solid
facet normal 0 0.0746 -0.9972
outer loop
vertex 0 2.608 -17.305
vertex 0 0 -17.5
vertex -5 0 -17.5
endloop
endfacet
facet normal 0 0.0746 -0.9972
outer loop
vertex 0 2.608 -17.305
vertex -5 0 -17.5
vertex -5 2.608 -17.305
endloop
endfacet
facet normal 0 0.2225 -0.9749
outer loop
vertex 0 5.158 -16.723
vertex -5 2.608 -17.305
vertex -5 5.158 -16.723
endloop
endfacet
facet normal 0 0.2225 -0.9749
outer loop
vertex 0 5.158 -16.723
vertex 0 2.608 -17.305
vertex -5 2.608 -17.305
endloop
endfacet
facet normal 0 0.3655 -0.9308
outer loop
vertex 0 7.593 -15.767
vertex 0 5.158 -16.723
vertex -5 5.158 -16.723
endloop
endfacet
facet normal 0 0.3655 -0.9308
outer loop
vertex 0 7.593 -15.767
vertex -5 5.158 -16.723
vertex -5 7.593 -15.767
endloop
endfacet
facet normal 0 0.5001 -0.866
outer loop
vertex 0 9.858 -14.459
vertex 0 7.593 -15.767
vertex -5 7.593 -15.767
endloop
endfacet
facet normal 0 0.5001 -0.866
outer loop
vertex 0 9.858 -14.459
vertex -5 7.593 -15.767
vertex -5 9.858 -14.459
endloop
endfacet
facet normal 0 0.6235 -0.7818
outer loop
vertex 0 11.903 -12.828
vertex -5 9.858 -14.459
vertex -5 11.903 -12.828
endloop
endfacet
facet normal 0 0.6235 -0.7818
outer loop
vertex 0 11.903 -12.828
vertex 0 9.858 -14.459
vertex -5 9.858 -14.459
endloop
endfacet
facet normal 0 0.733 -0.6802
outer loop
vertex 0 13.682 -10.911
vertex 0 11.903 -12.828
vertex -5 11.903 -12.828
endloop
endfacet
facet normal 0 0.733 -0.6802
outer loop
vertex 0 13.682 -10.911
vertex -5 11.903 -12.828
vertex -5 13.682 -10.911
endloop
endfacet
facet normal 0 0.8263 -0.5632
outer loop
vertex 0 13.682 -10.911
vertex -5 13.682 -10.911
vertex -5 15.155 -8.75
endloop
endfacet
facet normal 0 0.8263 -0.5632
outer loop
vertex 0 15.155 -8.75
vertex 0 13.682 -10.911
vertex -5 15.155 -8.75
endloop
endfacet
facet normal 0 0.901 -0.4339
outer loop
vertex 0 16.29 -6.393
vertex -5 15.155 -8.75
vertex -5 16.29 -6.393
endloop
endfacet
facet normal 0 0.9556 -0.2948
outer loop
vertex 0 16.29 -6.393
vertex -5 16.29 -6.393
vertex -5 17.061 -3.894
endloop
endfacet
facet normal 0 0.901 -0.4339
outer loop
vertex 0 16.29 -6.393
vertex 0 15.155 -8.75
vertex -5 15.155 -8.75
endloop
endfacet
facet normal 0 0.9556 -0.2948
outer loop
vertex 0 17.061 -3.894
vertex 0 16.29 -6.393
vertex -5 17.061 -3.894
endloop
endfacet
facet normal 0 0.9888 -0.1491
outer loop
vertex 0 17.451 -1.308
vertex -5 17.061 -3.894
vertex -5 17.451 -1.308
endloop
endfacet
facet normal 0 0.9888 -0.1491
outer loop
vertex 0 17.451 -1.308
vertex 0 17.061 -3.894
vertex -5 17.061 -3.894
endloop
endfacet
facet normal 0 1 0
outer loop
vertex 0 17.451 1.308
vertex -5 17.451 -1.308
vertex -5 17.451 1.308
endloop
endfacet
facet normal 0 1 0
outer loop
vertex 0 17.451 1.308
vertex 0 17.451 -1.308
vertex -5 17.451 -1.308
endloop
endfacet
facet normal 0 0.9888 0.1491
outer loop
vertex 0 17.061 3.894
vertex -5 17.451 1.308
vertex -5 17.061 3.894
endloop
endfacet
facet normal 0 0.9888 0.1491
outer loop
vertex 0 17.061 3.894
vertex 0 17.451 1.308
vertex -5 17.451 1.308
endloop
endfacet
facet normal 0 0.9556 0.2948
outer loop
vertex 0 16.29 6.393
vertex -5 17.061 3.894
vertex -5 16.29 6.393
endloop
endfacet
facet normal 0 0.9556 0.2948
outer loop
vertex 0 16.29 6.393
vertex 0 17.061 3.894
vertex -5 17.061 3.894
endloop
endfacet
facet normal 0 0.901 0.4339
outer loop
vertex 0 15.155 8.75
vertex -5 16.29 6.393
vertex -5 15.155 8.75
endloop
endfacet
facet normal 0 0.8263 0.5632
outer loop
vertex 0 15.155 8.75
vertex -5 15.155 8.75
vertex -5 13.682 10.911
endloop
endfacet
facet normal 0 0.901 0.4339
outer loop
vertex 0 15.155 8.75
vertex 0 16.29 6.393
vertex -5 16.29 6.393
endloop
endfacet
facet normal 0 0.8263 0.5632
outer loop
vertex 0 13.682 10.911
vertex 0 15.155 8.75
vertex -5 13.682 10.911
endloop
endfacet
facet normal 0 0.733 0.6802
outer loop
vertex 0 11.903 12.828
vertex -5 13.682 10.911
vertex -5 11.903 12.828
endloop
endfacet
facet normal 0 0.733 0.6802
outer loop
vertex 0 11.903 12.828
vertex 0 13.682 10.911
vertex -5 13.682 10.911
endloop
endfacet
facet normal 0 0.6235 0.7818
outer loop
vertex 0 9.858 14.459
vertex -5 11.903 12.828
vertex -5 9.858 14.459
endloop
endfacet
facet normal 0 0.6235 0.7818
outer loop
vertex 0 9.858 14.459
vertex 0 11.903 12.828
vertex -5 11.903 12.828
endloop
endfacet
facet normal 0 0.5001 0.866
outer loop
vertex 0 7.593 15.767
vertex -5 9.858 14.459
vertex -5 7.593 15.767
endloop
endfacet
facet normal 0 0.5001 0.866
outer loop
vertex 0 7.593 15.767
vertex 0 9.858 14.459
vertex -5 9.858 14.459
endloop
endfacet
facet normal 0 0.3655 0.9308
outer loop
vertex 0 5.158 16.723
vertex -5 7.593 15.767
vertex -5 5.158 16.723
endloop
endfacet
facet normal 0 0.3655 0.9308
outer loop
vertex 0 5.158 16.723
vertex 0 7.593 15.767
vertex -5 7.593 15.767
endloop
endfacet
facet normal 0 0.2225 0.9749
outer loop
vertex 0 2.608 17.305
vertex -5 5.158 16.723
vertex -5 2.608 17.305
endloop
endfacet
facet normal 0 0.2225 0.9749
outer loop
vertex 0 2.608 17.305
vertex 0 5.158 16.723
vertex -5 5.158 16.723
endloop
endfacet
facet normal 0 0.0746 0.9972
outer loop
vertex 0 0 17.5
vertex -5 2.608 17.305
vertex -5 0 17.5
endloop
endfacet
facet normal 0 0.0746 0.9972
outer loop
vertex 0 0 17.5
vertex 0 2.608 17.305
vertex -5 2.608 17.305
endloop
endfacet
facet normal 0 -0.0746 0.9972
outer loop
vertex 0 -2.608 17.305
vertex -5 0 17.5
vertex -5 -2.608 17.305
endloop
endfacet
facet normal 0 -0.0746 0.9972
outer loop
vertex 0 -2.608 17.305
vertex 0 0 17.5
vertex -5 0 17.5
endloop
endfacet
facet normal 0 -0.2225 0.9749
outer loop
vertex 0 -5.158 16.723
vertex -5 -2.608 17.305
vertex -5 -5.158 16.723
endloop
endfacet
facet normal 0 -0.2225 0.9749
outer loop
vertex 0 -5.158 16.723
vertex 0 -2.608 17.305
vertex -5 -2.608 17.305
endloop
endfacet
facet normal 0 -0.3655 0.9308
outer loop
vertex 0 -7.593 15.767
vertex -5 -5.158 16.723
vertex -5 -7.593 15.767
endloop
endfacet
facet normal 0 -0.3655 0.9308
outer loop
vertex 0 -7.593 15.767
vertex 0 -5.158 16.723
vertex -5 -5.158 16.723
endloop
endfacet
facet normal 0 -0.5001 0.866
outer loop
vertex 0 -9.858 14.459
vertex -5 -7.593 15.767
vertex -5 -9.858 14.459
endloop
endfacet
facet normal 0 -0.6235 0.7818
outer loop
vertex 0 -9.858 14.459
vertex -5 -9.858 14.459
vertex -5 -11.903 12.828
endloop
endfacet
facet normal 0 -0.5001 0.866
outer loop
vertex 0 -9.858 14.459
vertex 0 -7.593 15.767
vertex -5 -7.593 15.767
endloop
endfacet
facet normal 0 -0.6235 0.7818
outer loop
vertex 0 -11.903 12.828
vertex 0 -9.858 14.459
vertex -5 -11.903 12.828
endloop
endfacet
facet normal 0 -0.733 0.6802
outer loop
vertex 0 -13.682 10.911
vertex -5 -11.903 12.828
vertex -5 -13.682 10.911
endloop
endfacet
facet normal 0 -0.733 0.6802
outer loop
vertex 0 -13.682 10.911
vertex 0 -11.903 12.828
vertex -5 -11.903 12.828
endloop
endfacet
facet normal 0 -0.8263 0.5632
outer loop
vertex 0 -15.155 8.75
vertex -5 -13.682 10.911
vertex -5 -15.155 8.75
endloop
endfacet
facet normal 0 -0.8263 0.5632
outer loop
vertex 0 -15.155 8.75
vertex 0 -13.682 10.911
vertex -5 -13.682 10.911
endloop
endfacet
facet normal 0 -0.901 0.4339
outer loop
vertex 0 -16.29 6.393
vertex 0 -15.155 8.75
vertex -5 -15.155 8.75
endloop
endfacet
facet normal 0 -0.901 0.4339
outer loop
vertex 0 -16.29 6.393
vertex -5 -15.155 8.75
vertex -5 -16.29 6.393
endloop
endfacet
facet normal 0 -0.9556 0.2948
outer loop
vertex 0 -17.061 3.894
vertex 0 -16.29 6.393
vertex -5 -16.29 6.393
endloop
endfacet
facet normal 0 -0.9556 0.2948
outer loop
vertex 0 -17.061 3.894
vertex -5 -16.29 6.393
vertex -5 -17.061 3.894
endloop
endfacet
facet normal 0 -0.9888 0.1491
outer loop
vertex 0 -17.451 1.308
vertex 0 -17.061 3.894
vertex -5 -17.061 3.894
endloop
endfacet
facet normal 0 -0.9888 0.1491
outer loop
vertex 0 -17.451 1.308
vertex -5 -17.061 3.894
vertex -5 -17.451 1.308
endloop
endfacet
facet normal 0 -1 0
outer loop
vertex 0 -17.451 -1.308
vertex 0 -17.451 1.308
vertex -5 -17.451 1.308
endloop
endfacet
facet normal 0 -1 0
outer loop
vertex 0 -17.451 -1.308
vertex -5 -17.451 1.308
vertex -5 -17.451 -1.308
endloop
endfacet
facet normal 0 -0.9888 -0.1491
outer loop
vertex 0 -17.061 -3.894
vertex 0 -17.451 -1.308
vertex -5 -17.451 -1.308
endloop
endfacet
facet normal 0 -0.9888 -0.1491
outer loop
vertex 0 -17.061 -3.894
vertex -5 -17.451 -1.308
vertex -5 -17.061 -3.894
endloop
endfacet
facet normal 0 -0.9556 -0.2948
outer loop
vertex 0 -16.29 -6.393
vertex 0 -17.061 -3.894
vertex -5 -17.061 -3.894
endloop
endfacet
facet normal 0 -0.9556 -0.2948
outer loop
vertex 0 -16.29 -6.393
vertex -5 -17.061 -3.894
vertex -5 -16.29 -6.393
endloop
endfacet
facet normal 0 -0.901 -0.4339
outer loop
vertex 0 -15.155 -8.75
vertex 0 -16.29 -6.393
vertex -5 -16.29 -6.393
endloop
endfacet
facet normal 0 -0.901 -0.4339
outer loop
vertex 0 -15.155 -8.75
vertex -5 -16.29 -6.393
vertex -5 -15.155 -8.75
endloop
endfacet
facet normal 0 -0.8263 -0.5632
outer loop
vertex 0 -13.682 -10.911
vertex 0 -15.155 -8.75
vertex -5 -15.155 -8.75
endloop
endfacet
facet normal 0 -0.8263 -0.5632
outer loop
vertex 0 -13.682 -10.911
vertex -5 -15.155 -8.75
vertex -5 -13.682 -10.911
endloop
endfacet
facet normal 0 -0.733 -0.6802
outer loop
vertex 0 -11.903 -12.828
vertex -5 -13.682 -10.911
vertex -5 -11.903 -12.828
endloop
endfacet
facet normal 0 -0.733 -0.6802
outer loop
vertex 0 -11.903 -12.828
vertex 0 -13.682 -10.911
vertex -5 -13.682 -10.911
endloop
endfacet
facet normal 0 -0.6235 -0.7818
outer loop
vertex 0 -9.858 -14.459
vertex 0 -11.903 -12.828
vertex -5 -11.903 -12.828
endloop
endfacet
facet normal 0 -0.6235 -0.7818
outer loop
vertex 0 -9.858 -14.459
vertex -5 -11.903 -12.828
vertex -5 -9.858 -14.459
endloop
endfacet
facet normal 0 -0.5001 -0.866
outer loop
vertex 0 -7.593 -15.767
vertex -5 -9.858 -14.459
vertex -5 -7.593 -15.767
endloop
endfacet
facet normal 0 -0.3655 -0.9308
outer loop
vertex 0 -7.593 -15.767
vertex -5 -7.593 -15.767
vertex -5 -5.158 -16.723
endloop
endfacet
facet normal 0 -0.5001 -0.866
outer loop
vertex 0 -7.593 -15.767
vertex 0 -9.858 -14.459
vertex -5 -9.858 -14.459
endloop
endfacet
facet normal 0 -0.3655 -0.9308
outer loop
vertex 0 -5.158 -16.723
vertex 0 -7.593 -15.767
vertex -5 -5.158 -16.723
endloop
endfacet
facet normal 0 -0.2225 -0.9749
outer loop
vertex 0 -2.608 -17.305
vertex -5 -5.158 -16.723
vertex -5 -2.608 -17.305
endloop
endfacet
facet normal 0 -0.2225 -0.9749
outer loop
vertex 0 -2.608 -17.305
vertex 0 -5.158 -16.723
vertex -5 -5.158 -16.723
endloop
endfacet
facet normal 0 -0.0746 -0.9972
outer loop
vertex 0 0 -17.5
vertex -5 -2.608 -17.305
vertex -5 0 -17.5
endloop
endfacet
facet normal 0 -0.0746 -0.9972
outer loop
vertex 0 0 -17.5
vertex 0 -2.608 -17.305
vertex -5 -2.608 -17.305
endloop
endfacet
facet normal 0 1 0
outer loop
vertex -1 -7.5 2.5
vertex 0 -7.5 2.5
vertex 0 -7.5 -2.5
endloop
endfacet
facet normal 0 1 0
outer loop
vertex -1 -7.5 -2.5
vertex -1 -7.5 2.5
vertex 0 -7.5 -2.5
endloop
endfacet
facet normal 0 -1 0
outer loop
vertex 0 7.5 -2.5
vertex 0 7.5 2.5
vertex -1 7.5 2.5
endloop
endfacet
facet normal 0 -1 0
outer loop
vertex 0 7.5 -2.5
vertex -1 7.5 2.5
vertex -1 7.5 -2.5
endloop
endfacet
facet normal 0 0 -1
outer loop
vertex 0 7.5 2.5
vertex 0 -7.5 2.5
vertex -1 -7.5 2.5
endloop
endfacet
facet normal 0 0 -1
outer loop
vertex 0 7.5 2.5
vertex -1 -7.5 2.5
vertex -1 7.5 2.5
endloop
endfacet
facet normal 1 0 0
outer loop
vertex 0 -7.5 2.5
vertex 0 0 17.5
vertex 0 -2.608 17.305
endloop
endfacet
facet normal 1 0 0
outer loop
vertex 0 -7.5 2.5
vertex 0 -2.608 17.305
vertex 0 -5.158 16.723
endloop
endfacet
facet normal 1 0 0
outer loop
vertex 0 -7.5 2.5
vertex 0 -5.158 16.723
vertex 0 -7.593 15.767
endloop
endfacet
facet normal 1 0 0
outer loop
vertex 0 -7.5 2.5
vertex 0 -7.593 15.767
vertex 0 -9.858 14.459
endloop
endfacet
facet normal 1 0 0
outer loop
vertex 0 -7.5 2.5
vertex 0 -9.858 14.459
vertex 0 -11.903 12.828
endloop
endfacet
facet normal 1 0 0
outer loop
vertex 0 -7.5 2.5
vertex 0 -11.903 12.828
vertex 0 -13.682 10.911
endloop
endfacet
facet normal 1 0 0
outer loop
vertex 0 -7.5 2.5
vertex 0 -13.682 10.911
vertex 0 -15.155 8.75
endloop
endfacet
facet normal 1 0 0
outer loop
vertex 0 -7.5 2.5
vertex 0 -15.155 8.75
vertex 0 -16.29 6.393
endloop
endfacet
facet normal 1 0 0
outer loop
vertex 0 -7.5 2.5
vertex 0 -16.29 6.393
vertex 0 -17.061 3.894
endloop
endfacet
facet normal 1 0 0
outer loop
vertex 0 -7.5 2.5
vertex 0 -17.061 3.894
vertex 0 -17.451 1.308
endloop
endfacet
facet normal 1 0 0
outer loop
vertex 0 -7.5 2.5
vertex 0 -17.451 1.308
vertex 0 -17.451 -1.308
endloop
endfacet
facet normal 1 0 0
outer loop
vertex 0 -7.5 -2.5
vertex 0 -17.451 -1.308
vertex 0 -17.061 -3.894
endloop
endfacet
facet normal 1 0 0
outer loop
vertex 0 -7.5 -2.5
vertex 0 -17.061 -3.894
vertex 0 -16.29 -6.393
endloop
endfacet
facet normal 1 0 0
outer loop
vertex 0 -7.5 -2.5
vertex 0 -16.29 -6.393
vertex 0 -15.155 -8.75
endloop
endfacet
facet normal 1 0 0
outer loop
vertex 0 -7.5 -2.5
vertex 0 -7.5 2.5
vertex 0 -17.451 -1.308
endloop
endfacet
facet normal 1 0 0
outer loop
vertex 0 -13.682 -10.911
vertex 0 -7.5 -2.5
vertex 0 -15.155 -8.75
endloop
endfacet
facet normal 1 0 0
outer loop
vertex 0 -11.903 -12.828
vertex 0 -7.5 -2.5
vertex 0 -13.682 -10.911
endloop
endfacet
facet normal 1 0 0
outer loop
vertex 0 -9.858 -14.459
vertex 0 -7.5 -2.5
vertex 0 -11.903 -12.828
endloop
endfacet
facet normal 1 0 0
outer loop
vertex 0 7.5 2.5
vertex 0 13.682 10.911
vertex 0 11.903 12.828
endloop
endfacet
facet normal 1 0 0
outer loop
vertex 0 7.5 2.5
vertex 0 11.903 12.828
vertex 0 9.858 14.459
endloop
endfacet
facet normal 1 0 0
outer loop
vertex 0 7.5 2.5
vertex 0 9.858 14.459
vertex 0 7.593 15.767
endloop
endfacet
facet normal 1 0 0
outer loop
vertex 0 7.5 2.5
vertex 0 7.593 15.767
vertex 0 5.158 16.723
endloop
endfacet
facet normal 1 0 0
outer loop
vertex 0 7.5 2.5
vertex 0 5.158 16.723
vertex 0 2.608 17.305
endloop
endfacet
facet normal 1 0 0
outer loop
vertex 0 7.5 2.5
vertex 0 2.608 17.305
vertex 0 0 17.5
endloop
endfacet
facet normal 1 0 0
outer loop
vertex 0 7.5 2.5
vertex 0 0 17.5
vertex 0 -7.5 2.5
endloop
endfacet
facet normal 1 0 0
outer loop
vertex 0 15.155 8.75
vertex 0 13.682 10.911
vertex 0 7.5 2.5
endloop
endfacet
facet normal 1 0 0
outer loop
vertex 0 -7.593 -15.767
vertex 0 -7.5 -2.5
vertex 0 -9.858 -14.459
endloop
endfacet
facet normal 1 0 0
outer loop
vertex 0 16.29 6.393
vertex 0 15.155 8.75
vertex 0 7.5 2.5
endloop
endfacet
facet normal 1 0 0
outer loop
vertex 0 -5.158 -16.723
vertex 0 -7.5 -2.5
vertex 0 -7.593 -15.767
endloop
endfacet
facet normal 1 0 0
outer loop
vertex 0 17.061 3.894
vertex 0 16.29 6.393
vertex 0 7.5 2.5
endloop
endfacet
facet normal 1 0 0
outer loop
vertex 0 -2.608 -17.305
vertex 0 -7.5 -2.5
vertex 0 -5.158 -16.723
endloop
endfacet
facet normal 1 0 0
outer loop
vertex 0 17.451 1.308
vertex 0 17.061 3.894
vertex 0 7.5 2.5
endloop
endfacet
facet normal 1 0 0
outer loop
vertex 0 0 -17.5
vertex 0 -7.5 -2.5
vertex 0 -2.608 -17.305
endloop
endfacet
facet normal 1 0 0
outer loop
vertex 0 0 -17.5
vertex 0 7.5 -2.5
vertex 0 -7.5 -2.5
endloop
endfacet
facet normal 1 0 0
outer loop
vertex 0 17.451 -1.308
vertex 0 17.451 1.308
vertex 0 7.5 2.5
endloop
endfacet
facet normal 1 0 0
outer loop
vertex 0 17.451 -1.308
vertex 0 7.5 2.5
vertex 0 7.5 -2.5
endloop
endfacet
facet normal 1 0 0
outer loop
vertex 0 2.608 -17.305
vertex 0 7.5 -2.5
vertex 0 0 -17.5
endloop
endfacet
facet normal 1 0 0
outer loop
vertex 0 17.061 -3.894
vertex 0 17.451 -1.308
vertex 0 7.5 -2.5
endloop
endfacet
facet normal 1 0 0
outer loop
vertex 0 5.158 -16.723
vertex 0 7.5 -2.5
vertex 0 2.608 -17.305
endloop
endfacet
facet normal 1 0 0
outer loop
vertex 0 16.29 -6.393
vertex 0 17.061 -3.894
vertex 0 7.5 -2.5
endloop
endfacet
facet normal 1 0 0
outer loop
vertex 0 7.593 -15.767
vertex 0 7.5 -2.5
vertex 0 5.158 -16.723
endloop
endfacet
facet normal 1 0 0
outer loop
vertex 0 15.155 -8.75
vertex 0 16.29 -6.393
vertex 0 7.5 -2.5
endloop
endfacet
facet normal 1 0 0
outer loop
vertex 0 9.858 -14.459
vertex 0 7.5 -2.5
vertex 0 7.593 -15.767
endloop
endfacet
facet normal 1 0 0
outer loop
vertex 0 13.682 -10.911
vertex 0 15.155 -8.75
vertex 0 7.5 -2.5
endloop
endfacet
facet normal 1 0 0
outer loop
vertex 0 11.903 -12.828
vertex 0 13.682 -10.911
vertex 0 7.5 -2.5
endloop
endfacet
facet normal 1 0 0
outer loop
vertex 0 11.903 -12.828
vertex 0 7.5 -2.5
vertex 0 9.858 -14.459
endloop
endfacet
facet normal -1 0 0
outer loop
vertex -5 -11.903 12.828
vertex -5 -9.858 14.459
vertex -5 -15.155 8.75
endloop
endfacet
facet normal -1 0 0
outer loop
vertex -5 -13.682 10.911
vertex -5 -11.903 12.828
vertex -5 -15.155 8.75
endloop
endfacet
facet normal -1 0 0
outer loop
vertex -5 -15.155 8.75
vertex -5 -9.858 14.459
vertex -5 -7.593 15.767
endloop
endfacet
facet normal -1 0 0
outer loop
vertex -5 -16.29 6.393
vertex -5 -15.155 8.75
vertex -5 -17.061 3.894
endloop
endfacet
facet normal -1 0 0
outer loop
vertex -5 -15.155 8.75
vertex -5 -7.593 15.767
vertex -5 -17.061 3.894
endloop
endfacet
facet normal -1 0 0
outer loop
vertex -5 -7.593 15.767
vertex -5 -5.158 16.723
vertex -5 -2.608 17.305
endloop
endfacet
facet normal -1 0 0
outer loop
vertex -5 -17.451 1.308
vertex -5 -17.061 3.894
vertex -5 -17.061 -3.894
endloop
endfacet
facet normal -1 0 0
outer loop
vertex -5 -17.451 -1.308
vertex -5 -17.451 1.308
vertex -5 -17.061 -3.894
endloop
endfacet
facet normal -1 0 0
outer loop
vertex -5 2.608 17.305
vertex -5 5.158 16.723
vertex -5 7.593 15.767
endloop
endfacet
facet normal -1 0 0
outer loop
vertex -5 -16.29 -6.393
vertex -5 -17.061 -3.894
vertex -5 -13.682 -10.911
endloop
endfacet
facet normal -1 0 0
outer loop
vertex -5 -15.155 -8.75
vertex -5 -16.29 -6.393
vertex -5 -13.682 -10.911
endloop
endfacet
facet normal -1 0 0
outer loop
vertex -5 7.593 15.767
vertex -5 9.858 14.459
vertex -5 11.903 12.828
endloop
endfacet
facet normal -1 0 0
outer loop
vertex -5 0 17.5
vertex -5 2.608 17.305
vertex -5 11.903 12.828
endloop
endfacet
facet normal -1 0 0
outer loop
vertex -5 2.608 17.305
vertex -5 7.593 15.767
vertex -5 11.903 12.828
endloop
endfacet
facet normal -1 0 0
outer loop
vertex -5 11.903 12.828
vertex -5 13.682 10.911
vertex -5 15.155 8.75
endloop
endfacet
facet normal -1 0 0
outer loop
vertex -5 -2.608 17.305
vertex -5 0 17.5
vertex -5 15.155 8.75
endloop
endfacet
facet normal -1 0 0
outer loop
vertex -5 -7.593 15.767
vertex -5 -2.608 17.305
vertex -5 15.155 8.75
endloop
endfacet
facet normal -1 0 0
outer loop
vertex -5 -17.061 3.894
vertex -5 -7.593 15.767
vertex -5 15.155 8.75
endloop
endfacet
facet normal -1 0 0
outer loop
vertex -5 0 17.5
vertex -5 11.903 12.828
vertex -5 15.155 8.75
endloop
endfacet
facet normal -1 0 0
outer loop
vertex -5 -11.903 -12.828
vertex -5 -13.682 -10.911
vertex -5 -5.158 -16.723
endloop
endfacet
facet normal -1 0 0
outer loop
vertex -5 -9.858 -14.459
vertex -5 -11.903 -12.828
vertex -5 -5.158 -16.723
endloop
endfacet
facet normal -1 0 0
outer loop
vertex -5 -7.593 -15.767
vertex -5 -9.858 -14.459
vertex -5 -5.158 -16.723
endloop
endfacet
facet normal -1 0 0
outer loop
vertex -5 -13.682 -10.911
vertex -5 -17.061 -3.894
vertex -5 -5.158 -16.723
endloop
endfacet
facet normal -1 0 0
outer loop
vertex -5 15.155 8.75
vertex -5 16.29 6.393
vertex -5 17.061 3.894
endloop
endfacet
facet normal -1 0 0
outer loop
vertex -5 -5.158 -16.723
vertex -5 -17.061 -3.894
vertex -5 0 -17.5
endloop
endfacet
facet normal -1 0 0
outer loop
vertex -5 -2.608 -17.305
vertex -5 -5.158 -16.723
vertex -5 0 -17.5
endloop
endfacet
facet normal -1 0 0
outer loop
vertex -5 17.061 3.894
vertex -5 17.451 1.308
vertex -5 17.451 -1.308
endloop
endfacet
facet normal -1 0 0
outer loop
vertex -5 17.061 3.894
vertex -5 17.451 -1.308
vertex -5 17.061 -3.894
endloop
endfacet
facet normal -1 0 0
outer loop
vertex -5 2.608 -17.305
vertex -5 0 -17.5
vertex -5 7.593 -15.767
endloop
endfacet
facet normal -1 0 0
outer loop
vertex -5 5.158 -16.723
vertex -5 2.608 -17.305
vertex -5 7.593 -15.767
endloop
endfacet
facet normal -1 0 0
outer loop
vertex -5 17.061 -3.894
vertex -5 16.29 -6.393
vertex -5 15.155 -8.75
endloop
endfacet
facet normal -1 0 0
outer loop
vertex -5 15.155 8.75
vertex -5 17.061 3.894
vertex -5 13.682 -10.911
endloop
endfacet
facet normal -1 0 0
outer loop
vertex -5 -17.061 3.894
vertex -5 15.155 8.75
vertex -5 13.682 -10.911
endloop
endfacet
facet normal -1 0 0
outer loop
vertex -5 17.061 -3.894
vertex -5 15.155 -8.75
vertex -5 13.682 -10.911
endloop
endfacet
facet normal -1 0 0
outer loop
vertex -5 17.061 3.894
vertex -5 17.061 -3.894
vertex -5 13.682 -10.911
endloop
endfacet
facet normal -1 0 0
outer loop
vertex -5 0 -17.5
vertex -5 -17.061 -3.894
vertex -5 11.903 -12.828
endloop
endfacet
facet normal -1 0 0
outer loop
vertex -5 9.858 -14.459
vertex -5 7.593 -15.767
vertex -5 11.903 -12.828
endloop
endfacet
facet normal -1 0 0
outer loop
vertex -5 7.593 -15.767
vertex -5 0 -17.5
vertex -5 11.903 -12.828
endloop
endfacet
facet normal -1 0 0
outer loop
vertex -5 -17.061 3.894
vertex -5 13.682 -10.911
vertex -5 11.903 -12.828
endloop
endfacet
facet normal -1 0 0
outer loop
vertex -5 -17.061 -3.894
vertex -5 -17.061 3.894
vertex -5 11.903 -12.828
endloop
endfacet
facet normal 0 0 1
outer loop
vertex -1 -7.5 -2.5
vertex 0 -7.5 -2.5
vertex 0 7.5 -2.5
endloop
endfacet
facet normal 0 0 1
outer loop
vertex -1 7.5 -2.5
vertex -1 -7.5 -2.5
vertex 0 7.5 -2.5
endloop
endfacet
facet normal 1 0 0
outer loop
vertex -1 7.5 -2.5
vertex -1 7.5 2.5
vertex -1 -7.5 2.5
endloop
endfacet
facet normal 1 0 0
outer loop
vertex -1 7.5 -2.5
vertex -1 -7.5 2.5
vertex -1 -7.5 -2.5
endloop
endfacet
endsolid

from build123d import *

# Parameters (mm, degrees)
SKETCH1_R           = 17.5
BOSS_EXTRUDE1_DEPTH = 5
SKETCH1_3_W         = 5
SKETCH1_3_H         = 15
CUT_EXTRUDE1_DEPTH  = 1


with BuildPart() as part:
    # Sketch1 → Boss-Extrude1 (new body)
    with BuildSketch(Plane(origin=(0, 0, 0), x_dir=(0, 0, -1), z_dir=(1, 0, 0))):
        Circle(SKETCH1_R)
    extrude(amount=-BOSS_EXTRUDE1_DEPTH)

    # Sketch1<3> → Cut-Extrude1 (cut)
    with BuildSketch(Plane(origin=(0, 0, 0), x_dir=(0, 0, -1), z_dir=(1, 0, 0))):
        Rectangle(SKETCH1_3_W, SKETCH1_3_H)
    extrude(amount=-CUT_EXTRUDE1_DEPTH, mode=Mode.SUBTRACT)


solid = part.part
